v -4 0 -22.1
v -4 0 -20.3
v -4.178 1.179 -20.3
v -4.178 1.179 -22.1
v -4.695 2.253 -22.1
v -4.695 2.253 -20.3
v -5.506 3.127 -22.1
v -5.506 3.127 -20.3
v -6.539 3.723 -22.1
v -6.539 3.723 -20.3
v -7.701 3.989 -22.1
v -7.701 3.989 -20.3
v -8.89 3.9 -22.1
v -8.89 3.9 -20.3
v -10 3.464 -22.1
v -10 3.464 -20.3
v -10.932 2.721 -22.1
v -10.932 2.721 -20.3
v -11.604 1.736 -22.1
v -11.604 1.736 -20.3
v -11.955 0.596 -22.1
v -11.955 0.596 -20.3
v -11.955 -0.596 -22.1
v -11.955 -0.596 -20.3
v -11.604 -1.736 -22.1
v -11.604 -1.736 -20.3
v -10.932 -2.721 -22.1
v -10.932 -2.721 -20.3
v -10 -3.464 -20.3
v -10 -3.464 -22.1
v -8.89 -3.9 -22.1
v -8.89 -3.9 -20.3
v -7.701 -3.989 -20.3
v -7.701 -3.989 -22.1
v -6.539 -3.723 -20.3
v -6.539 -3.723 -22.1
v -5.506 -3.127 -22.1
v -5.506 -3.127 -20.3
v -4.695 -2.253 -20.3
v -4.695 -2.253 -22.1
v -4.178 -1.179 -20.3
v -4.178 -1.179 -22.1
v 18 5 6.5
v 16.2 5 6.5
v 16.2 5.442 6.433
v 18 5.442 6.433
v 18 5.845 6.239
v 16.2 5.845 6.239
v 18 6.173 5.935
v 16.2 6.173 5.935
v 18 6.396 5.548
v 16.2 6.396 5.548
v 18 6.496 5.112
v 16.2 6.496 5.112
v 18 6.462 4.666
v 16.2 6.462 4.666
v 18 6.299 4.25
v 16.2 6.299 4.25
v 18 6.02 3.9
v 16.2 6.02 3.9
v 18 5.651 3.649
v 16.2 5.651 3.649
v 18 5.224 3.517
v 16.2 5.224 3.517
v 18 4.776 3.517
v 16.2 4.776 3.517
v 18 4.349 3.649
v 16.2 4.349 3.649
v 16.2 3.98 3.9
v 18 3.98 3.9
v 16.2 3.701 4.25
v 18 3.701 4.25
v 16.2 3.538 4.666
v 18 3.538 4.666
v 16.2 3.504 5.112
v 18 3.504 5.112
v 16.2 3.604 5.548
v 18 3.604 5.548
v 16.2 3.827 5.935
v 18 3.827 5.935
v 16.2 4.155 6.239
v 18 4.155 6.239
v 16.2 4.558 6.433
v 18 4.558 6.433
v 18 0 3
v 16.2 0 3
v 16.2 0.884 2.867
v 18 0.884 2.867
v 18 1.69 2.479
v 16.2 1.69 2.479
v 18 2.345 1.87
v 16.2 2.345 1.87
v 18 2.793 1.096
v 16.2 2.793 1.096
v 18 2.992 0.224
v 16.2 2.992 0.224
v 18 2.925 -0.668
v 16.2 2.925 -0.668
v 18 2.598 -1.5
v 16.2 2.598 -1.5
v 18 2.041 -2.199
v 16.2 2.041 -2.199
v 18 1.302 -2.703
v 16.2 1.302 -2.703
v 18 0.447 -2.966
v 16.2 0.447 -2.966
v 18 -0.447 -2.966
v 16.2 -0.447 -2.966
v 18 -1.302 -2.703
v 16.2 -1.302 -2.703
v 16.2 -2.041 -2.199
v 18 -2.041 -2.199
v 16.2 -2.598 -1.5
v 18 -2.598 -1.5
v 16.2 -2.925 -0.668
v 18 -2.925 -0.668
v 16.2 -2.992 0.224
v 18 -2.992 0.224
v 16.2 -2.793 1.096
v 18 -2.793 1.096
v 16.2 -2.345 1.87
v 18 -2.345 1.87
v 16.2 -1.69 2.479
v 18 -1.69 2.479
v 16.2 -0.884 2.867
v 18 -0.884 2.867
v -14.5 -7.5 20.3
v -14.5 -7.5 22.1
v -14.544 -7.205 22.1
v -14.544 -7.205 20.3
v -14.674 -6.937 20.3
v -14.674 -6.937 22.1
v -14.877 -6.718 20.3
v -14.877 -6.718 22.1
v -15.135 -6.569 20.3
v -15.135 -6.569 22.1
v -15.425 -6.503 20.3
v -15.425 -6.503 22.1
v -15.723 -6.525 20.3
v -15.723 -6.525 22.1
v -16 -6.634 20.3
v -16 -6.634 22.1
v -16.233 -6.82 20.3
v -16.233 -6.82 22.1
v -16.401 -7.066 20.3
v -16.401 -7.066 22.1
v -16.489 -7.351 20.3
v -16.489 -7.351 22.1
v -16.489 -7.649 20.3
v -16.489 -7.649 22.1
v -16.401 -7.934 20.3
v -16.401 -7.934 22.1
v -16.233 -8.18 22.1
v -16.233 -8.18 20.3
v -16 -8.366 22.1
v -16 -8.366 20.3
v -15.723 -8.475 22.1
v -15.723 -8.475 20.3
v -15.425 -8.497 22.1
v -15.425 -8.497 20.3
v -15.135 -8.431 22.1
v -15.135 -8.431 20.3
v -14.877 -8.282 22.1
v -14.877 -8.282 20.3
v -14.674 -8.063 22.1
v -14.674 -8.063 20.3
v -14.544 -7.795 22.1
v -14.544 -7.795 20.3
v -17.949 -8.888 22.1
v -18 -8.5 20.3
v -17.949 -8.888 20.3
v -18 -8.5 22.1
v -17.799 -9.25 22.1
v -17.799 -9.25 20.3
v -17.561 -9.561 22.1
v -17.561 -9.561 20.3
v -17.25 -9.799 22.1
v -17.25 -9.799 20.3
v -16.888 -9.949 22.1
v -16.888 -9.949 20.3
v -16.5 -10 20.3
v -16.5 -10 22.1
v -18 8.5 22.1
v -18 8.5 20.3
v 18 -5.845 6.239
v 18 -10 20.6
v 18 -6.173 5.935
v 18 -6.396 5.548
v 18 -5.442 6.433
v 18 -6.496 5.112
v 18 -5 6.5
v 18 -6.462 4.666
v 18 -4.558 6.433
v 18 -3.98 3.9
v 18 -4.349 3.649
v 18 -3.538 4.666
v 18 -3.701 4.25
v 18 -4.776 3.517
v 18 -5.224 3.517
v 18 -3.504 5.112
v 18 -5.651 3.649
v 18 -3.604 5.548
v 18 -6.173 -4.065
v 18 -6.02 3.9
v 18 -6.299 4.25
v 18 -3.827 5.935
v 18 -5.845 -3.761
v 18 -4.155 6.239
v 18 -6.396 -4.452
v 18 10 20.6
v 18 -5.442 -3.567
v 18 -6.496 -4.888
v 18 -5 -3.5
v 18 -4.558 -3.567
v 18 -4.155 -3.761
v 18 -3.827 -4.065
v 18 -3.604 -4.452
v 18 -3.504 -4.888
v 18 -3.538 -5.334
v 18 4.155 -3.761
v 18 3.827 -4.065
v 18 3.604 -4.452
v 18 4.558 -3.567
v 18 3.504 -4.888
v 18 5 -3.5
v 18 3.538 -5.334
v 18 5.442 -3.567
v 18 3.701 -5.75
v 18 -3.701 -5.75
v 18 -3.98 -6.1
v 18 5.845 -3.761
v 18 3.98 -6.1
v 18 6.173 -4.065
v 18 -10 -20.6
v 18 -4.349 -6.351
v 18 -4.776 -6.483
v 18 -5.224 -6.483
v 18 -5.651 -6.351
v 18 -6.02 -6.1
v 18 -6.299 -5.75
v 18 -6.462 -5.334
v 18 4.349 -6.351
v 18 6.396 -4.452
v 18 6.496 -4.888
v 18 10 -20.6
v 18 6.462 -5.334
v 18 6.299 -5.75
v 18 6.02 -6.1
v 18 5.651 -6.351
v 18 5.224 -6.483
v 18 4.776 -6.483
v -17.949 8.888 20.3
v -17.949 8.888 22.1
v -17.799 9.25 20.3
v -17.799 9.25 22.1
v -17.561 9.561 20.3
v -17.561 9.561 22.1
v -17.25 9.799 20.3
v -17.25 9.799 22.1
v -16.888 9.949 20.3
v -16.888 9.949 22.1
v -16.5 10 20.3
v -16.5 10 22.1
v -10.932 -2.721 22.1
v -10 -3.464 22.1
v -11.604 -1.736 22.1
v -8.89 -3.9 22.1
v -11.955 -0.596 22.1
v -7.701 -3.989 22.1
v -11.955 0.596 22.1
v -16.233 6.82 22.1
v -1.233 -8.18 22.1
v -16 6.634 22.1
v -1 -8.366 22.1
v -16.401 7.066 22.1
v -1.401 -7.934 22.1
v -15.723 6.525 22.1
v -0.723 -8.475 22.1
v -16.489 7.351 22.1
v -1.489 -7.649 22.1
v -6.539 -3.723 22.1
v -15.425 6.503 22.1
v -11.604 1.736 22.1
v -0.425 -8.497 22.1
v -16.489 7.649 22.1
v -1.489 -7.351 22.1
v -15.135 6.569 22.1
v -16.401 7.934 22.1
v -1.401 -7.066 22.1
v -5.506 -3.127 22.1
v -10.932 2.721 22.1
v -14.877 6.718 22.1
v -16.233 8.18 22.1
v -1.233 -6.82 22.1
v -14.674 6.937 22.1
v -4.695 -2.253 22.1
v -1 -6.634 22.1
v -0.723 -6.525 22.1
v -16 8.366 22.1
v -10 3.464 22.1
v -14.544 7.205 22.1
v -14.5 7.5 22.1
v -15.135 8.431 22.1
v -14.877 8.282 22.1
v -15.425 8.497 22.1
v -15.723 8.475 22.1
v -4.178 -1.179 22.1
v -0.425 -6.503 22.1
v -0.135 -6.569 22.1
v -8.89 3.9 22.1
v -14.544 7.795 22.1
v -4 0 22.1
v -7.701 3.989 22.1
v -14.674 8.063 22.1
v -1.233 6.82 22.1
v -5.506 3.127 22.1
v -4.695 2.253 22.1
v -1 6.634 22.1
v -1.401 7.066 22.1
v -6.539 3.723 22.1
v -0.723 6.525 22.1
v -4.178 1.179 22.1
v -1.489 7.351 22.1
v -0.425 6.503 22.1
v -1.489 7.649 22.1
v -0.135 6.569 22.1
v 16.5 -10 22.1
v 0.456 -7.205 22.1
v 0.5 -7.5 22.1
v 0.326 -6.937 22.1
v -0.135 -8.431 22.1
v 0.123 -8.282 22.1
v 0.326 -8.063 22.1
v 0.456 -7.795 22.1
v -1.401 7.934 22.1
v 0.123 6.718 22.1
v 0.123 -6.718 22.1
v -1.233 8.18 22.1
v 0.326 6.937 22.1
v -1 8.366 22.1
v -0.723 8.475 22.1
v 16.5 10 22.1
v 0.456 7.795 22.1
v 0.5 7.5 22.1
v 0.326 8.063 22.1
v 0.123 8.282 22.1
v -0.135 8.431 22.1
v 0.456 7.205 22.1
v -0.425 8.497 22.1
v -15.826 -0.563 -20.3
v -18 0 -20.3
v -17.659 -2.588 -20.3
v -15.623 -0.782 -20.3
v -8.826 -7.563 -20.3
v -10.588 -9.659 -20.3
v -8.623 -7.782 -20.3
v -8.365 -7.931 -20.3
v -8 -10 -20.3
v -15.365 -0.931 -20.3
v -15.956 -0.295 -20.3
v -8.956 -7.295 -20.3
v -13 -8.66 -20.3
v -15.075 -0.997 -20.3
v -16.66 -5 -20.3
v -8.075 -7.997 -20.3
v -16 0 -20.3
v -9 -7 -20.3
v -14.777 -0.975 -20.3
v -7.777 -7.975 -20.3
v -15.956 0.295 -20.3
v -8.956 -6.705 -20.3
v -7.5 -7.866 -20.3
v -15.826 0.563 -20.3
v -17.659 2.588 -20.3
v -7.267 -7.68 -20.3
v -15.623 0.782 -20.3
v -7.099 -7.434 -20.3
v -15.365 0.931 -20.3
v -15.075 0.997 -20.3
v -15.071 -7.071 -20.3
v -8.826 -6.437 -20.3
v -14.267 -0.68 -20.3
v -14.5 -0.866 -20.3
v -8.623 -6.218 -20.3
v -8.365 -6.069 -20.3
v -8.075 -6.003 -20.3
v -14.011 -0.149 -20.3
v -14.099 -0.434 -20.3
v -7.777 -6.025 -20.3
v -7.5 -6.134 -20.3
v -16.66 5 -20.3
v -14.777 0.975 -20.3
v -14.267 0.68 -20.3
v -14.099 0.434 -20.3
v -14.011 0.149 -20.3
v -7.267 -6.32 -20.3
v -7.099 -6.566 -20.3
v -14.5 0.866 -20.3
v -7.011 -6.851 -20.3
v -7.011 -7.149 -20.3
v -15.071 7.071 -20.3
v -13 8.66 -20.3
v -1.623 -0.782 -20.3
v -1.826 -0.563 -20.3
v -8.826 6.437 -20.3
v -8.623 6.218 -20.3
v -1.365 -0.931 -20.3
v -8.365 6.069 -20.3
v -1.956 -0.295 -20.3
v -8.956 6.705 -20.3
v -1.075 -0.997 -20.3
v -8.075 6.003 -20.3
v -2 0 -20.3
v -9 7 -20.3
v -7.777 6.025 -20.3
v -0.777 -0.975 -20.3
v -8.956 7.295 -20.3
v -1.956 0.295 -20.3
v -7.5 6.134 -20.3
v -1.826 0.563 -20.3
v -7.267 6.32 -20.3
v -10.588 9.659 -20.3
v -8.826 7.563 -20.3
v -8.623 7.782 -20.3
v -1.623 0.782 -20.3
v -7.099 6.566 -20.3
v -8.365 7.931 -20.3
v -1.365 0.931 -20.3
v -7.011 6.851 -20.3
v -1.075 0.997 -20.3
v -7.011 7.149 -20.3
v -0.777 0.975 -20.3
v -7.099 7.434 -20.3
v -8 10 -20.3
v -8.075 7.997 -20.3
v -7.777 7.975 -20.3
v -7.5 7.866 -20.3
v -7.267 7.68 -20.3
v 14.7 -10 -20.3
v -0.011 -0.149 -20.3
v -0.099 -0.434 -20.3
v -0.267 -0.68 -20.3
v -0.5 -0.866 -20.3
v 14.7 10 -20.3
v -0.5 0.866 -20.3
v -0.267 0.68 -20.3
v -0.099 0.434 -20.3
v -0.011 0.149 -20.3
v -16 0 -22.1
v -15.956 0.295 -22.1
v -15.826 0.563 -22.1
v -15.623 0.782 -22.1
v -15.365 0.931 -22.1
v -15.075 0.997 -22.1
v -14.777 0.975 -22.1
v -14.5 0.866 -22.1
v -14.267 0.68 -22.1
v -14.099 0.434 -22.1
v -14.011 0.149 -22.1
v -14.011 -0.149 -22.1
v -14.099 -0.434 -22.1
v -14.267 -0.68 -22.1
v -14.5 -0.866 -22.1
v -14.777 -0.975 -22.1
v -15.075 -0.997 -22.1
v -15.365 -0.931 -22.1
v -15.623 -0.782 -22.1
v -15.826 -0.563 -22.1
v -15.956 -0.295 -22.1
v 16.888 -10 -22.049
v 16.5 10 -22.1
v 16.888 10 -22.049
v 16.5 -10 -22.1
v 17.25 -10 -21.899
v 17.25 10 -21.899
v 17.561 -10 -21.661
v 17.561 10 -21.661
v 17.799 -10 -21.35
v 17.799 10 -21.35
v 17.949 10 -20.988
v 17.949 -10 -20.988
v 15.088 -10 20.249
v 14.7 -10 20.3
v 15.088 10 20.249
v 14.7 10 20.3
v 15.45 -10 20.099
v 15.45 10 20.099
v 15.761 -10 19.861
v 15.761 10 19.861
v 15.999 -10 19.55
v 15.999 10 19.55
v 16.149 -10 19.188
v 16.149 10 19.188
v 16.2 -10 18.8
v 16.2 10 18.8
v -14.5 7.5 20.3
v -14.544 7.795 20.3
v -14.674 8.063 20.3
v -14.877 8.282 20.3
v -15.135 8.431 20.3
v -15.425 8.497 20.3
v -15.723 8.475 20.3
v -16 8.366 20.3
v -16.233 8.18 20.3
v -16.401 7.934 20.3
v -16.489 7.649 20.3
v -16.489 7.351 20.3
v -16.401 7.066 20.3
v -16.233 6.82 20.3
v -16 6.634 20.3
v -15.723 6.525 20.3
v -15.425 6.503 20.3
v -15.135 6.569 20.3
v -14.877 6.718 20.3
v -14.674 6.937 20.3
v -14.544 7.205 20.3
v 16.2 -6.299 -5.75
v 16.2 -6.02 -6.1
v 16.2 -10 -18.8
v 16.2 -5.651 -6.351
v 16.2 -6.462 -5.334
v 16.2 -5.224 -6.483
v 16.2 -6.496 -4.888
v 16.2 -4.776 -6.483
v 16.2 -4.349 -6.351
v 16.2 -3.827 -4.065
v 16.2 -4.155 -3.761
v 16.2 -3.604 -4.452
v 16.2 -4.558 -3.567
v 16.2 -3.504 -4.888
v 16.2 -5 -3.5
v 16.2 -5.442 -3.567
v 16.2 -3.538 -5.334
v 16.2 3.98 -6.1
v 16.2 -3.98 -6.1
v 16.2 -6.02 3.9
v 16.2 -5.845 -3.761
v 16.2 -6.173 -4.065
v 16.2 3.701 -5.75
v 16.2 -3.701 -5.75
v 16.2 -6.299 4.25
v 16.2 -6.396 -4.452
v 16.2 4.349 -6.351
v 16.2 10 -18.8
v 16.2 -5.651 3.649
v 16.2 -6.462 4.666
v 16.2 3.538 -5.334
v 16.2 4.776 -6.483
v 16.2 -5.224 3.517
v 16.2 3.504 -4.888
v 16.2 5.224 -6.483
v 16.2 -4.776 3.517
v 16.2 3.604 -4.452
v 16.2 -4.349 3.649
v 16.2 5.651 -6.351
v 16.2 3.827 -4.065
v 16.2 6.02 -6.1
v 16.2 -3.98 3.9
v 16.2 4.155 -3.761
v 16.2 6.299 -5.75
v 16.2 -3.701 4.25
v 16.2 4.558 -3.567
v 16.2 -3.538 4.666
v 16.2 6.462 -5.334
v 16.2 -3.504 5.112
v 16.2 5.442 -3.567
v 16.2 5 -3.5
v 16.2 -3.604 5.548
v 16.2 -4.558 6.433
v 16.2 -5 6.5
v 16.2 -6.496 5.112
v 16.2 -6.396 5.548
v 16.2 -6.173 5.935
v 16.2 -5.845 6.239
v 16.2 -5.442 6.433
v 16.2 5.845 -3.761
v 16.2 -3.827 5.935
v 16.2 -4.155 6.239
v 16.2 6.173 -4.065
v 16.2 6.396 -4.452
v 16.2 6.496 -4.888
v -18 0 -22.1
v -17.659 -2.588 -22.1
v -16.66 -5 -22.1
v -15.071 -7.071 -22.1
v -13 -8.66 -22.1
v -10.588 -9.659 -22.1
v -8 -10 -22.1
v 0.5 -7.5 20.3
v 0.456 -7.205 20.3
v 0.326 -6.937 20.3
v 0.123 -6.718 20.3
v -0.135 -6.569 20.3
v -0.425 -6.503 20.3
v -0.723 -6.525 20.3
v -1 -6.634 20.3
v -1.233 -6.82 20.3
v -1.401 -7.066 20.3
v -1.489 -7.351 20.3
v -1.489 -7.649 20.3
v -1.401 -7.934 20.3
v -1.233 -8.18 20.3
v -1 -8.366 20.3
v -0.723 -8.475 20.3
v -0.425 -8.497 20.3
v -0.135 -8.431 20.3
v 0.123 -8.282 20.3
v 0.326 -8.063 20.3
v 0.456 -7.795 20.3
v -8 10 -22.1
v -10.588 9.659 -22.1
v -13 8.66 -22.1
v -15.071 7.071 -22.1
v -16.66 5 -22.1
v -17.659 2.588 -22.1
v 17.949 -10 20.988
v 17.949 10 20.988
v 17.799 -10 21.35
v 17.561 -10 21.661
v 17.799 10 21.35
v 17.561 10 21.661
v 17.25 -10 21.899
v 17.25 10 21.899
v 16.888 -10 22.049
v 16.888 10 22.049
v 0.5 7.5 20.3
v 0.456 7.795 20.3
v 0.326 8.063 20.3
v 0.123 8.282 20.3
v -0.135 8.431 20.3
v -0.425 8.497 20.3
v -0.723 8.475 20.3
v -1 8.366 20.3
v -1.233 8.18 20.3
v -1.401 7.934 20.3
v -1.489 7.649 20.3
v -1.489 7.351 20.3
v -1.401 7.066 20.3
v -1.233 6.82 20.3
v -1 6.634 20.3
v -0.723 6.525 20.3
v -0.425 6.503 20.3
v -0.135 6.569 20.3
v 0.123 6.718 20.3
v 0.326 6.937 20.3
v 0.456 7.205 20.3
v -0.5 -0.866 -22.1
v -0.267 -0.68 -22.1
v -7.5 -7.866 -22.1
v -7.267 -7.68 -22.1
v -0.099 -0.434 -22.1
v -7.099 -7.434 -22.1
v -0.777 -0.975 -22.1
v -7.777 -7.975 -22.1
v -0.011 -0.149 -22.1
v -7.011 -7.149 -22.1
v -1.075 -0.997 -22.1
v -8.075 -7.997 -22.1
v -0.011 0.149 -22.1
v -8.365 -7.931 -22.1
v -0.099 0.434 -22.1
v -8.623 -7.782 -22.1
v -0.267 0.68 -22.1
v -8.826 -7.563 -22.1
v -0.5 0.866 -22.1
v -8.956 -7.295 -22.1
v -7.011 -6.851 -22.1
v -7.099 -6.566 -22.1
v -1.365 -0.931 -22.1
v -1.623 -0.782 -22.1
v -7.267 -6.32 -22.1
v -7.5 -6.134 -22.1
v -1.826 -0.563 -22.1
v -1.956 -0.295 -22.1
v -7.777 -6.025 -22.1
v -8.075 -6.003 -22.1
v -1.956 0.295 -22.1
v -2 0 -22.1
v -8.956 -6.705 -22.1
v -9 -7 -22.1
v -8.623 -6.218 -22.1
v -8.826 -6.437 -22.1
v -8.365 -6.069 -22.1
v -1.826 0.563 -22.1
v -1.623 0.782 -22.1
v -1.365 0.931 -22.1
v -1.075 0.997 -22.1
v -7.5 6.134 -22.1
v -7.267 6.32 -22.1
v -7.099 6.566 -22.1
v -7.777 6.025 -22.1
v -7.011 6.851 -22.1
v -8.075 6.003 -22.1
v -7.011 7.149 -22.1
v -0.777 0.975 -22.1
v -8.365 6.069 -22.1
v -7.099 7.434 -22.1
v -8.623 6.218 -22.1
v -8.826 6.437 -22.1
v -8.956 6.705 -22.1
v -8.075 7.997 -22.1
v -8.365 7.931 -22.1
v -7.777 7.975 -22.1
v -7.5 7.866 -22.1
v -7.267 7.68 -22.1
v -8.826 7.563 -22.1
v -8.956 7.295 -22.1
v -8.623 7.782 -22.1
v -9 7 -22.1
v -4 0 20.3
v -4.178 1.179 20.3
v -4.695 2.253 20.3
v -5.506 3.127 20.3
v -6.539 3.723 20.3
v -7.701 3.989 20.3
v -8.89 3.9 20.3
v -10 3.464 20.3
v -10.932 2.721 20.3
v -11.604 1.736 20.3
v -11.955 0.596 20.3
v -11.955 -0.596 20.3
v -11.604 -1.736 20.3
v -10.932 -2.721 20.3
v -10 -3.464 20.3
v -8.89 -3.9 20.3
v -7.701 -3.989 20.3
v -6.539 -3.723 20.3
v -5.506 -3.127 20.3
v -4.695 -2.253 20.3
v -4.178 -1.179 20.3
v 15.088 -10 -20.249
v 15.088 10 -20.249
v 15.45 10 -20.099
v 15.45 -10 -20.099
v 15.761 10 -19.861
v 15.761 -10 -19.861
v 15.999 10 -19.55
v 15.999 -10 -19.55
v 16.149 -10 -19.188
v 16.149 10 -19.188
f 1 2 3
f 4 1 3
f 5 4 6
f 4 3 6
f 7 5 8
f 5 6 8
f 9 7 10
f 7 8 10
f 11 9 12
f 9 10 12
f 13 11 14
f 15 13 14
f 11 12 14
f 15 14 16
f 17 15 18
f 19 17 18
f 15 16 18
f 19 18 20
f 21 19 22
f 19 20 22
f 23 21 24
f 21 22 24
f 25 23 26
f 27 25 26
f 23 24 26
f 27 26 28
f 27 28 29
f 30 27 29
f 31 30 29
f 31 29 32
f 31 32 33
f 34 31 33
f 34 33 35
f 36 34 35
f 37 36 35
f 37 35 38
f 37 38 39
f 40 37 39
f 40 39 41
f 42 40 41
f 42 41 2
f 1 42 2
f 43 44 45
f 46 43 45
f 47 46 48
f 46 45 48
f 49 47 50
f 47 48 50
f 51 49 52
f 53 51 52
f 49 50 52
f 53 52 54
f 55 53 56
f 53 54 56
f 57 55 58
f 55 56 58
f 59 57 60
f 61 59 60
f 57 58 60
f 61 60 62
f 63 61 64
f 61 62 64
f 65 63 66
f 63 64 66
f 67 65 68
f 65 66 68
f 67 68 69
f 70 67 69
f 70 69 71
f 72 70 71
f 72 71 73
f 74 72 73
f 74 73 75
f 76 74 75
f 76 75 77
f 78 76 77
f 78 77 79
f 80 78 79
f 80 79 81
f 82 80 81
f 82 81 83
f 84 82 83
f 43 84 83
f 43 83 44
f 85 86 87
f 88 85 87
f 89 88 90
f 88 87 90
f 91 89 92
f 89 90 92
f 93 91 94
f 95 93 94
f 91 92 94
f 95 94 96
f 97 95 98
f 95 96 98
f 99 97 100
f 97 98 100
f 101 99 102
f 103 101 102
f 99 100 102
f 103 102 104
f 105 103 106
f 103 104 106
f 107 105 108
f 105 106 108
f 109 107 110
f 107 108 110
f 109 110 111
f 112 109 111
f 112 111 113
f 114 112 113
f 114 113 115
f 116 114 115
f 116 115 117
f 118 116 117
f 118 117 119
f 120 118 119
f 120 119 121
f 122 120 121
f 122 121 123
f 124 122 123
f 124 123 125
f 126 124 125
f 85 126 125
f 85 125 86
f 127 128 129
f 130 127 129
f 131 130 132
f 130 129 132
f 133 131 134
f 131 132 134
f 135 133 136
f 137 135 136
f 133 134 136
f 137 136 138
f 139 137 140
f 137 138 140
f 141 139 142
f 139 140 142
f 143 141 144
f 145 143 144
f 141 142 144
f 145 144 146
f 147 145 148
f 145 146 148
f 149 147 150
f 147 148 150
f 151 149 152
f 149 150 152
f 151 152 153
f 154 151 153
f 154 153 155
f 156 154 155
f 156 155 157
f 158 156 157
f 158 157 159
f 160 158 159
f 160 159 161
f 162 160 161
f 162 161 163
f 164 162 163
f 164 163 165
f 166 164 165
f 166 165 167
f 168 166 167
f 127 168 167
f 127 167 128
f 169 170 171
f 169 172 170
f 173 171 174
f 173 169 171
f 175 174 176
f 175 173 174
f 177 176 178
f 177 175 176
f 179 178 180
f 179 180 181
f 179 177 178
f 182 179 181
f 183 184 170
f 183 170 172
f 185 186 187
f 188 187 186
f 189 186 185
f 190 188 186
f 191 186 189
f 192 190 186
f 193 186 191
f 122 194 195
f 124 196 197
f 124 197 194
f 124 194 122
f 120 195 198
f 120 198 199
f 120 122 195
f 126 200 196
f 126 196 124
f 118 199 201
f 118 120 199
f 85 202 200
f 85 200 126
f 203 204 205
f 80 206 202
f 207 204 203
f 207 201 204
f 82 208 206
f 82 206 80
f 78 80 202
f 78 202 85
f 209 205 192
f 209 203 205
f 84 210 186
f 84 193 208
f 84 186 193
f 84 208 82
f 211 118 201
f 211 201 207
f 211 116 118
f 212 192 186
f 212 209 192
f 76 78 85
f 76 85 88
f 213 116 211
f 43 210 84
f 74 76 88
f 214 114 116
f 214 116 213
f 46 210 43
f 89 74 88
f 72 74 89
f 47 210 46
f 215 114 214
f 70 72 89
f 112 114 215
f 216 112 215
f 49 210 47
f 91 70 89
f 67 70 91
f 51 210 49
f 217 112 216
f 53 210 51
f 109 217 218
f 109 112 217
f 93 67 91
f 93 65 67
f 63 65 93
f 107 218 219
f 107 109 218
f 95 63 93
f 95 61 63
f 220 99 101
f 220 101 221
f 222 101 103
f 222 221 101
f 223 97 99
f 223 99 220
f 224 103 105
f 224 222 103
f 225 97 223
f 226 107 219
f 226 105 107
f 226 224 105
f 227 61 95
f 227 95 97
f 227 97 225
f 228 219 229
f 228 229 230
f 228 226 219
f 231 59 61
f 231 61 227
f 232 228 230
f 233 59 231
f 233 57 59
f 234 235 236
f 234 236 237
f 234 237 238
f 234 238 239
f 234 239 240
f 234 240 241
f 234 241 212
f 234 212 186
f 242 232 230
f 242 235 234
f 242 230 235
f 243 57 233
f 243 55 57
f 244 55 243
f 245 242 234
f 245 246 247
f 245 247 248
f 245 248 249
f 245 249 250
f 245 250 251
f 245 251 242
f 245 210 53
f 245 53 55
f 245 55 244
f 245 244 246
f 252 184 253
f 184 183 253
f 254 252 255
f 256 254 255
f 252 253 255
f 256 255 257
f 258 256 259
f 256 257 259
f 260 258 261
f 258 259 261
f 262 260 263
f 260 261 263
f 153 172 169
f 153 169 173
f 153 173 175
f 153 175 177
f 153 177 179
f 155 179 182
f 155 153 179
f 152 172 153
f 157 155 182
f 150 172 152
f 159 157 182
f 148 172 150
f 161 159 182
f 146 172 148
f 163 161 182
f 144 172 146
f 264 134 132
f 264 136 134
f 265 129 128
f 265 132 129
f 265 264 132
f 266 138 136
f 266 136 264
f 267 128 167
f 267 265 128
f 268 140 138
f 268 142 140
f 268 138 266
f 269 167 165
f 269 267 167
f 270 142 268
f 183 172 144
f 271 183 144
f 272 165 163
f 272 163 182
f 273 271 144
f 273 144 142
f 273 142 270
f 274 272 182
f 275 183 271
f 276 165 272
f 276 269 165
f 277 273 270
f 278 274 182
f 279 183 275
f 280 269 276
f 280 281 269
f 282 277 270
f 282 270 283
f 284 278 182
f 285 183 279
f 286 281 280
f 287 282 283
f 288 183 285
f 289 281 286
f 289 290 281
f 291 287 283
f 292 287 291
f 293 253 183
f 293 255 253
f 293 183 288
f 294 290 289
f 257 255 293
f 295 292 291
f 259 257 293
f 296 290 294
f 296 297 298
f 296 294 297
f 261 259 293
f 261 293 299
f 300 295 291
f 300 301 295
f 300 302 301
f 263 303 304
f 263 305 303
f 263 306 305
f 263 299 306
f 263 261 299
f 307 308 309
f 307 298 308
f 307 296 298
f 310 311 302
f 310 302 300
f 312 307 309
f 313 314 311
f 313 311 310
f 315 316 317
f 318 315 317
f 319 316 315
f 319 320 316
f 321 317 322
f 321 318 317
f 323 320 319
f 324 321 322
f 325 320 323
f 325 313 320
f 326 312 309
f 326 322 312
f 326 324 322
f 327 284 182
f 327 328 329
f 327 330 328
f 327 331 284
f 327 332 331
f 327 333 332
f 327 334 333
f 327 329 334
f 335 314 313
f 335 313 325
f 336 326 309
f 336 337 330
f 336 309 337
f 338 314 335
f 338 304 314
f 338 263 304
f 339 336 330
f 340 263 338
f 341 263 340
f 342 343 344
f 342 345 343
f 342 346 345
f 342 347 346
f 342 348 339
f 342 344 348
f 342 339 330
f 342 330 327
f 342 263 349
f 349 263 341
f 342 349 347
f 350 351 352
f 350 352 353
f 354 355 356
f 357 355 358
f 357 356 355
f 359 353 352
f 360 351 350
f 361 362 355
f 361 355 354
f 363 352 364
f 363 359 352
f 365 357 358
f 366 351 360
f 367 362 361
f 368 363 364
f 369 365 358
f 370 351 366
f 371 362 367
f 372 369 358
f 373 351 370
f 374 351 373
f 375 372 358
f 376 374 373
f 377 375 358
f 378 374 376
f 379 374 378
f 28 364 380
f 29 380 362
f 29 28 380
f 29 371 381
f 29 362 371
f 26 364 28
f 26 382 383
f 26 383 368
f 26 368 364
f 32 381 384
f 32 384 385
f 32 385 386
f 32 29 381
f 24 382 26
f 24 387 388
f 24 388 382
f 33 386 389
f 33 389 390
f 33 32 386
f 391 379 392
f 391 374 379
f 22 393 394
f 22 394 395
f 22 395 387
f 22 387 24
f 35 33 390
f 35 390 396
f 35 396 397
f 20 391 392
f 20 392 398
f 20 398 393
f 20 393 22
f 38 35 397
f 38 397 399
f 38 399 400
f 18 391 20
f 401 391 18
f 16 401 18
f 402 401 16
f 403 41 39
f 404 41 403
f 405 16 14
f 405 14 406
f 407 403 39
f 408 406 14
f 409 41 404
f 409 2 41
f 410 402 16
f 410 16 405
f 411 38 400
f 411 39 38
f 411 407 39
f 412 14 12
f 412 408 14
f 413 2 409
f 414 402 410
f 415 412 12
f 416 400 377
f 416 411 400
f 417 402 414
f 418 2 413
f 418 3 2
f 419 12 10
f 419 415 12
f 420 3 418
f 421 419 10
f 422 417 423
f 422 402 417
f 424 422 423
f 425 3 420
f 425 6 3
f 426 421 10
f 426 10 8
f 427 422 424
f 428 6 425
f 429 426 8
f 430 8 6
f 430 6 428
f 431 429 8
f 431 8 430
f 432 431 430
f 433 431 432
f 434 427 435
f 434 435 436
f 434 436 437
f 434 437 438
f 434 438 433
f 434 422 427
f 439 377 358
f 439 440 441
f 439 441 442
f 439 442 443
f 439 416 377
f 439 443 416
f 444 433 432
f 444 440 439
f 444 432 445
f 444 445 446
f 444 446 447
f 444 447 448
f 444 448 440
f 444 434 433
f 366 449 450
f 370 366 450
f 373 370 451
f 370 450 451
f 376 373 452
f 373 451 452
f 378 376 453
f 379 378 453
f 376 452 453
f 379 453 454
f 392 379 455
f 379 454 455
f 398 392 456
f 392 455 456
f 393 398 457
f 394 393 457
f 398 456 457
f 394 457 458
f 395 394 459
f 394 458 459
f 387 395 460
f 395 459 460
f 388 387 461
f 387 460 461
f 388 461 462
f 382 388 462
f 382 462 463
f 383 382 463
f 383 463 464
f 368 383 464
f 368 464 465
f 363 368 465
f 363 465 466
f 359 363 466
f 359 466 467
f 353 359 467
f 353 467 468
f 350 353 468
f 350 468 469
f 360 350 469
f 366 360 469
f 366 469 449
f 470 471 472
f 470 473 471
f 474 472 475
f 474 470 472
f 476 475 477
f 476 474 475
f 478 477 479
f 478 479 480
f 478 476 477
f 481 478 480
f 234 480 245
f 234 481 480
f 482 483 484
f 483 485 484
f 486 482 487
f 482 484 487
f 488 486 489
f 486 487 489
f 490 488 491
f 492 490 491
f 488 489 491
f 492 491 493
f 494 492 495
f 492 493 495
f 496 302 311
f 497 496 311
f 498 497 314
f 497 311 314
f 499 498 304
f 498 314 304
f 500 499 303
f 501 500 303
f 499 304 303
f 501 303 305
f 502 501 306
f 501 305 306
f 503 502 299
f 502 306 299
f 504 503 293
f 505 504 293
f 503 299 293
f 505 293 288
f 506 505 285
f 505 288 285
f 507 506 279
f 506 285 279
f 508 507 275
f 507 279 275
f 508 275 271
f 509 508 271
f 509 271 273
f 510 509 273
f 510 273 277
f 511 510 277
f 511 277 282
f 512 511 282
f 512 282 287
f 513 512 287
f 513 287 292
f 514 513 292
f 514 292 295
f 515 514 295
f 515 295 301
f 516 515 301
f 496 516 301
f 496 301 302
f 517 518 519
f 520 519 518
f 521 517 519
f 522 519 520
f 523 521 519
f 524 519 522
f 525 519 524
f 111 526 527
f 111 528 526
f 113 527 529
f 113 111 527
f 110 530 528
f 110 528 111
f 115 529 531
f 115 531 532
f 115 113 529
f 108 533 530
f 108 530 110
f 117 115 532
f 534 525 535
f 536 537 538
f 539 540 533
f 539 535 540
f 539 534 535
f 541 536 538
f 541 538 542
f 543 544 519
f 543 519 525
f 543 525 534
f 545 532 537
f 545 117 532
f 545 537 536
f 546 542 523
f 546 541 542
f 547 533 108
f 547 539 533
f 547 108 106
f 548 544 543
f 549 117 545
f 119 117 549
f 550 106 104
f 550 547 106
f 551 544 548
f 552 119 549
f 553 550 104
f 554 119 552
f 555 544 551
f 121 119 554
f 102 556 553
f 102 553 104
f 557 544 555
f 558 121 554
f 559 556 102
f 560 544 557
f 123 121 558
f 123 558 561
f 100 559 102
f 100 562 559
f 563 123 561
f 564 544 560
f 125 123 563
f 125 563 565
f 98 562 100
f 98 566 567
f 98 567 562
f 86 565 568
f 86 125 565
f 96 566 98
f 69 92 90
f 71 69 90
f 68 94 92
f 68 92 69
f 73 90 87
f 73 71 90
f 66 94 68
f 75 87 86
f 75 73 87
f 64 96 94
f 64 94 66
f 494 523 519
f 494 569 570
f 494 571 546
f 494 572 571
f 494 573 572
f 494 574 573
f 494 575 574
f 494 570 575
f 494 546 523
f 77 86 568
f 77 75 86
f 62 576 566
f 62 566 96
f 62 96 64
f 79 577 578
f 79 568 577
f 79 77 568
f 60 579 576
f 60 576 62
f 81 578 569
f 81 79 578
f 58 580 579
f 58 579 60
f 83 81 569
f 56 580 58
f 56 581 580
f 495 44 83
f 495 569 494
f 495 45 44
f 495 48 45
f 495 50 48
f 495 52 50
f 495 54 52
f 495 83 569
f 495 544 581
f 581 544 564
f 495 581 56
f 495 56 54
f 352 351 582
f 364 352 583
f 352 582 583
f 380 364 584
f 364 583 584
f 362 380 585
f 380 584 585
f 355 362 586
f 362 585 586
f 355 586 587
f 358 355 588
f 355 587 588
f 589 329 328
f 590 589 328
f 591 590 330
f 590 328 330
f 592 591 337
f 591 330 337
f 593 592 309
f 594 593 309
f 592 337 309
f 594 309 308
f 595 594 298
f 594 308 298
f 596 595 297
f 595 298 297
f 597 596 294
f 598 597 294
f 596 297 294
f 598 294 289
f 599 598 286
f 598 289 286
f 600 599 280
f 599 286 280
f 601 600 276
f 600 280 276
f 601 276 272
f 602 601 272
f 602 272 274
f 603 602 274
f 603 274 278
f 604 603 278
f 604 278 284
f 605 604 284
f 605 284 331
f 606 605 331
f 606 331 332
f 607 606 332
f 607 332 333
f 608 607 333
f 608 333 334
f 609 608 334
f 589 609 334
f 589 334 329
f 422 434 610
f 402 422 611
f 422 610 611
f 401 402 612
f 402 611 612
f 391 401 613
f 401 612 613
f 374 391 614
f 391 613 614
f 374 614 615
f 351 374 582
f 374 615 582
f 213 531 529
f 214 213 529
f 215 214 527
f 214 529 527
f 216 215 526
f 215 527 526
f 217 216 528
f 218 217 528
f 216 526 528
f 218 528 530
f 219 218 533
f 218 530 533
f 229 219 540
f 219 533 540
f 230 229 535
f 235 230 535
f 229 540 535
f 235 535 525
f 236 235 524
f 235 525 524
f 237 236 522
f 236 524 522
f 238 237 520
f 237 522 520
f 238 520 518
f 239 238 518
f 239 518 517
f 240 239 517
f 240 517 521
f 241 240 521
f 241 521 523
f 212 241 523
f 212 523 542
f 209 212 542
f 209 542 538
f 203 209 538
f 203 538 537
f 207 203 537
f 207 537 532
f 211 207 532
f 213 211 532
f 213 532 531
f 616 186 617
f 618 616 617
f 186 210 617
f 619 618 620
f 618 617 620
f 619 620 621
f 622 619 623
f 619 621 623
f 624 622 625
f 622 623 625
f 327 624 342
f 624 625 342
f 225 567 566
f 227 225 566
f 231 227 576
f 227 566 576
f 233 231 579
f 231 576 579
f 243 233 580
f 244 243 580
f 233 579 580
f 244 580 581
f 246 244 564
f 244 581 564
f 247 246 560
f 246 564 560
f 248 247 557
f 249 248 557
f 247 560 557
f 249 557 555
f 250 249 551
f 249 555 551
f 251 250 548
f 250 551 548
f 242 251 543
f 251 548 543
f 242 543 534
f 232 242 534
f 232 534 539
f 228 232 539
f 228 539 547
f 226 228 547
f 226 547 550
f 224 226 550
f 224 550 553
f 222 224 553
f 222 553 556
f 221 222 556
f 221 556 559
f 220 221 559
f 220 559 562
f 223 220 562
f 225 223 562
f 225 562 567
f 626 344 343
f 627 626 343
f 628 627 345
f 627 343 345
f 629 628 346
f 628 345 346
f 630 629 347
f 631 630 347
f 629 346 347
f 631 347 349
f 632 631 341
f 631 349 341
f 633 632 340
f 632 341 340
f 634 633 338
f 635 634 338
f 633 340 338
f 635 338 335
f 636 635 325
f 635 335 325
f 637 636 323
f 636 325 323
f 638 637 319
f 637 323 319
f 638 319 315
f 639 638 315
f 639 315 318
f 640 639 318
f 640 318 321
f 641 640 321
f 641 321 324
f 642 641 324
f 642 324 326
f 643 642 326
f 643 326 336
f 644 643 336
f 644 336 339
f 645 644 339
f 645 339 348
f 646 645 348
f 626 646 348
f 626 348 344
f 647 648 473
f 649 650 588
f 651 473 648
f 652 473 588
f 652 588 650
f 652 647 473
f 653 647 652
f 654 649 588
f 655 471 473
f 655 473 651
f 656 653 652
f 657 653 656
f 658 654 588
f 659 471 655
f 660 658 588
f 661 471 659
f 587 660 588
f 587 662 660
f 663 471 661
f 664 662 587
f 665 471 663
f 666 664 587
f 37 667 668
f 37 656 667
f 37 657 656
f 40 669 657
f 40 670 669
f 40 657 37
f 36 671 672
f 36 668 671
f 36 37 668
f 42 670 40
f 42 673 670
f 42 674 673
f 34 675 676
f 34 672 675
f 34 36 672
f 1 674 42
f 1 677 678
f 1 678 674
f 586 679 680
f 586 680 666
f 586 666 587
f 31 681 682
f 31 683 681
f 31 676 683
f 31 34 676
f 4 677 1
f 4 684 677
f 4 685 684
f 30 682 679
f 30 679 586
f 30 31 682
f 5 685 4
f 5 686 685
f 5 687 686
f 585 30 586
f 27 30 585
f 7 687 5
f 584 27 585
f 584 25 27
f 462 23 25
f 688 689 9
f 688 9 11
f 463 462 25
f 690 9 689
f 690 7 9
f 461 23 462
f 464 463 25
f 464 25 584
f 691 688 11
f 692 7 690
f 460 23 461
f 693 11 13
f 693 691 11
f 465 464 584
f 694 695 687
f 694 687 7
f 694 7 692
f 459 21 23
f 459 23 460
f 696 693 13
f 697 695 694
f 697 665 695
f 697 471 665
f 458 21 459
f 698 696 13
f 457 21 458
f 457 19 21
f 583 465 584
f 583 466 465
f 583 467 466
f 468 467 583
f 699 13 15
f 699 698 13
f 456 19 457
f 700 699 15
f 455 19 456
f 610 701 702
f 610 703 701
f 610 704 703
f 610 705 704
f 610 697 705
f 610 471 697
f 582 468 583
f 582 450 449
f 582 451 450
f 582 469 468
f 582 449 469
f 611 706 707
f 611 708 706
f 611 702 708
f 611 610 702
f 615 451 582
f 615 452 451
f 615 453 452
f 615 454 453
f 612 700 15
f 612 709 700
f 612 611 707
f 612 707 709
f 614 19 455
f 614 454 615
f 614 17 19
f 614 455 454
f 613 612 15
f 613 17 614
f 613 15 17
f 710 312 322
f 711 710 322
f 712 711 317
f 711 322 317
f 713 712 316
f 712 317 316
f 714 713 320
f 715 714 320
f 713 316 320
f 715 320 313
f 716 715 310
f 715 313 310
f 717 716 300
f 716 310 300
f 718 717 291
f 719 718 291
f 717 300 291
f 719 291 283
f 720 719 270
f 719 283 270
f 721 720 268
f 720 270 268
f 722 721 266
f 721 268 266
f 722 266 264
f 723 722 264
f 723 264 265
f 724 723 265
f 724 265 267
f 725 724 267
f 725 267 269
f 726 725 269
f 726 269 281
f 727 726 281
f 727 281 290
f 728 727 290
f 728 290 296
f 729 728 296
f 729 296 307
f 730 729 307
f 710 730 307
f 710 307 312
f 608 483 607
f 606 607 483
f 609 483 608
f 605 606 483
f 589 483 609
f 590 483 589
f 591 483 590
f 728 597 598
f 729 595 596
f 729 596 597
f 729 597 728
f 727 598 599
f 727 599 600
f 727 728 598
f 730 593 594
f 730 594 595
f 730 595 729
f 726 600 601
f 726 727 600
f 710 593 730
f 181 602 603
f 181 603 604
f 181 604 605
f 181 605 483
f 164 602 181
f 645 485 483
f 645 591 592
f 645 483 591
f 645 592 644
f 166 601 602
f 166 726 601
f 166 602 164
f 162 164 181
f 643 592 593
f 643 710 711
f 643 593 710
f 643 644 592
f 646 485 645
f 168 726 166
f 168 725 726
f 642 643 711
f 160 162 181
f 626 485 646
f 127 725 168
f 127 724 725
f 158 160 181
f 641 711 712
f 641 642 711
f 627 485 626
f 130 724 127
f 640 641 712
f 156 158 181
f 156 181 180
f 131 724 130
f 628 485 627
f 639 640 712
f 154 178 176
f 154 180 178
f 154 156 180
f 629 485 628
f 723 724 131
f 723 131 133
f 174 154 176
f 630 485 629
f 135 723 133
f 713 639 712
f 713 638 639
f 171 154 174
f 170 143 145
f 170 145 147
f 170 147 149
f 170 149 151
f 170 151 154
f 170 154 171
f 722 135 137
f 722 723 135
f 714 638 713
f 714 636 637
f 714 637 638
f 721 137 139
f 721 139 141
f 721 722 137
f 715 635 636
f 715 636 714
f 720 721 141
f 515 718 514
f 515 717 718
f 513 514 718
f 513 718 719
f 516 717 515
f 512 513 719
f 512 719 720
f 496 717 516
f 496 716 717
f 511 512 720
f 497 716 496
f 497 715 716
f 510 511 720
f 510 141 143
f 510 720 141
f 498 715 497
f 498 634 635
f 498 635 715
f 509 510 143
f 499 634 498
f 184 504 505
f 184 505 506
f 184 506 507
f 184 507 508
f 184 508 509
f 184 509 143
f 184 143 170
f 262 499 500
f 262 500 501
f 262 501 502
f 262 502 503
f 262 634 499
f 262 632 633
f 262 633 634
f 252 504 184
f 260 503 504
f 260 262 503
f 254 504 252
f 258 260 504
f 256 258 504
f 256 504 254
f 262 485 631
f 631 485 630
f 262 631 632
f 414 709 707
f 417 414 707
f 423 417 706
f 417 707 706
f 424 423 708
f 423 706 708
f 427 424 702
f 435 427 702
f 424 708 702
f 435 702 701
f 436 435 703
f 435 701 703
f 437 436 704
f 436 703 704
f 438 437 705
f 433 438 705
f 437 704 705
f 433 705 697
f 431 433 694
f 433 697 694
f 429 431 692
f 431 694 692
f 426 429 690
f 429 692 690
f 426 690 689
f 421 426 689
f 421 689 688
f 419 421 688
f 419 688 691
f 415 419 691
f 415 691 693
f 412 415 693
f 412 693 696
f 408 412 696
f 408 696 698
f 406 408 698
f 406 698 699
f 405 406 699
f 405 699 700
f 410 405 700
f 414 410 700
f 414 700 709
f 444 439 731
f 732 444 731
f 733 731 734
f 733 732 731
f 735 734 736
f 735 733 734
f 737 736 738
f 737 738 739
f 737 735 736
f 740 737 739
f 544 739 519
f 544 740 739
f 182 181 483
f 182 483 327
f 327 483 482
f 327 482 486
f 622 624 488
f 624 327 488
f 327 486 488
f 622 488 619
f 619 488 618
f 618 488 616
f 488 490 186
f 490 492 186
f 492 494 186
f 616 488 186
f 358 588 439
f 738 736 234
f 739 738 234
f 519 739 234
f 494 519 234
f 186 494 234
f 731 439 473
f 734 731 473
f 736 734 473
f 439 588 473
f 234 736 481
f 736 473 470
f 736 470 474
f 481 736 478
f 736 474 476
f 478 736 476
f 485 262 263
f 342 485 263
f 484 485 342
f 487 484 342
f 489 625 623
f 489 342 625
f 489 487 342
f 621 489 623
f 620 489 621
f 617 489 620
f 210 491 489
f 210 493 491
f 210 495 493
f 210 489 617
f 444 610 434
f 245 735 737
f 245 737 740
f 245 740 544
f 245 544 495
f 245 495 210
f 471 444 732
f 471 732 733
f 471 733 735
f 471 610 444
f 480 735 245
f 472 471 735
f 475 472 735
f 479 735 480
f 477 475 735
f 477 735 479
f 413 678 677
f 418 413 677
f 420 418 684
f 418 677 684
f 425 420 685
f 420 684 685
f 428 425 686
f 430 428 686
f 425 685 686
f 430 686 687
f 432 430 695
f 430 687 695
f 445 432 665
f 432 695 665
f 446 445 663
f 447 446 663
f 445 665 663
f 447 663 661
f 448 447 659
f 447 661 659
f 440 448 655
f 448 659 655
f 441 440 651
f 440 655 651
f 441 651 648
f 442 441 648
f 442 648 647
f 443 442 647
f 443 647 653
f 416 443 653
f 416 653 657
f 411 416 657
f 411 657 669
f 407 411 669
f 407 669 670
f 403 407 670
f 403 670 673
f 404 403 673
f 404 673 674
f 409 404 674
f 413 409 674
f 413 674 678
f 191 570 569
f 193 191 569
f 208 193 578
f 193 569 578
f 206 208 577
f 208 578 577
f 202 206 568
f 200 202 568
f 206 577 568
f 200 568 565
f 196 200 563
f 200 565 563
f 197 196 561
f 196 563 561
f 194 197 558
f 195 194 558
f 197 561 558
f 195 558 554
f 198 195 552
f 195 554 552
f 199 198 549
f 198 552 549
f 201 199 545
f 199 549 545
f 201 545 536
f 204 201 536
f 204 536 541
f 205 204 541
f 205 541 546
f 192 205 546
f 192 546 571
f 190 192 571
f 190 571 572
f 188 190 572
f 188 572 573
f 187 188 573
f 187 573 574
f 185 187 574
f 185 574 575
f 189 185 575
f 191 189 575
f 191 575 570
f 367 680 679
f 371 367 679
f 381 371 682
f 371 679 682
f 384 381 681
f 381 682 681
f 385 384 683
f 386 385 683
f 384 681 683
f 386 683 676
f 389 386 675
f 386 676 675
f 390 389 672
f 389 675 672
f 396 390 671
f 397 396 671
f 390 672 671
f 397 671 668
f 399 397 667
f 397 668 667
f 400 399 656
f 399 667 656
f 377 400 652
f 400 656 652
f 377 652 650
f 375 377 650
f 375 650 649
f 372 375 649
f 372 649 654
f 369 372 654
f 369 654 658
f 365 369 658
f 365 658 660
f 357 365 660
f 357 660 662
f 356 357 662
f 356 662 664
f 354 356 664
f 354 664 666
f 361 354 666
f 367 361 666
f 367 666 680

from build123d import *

# Parameters (mm, degrees)
BOSS_EXTRUDE1_DEPTH = 10
FILLET1_R           = 1.5
CUT_EXTRUDE1_DEPTH  = 2
SKETCH4_R           = 4
CUT_EXTRUDE3_DEPTH  = 45.2
SKETCH6_R           = 3
SKETCH6_R_2         = 1.5
CUT_EXTRUDE4_DEPTH  = 2
SKETCH7_R           = 1
CUT_EXTRUDE5_DEPTH  = 2
SKETCH8_R           = 1
CUT_EXTRUDE6_DEPTH  = 2


with BuildPart() as part:
    # Sketch1 → Boss-Extrude1 (new body, symmetric)
    with BuildSketch(Plane(origin=(0, 0, 0), x_dir=(1, 0, 0), z_dir=(0, 1, 0))):
        Polygon((-18, 20.3), (16.2, 20.3), (16.2, -20.3), (-18, -20.3), (-18, -22.1), (18, -22.1), (18, 22.1), (-18, 22.1), align=None)
    extrude(amount=BOSS_EXTRUDE1_DEPTH, both=True)

    # Fillet1
    fillet1_edges = [part.edges().sort_by_distance(p)[0] for p in [
        (18, 0, -22.1),
        (18, 0, 22.1),
        (16.2, 0, 20.3),
        (16.2, 0, -20.3),
        (-18, 10, 21.2),
        (-18, -10, 21.2),
    ]]
    fillet(fillet1_edges, radius=FILLET1_R)

    # Sketch2 → Cut-Extrude1 (cut)
    with BuildSketch(Plane(origin=(0, 0, -22.1), x_dir=(-1, 0, 0), z_dir=(0, 0, -1))):
        with BuildLine():
            Line((18, 10), (8, 10))
            ThreePointArc((8, 10), (15.071067812, 7.071067812), (18, 0))
            Line((18, 0), (18, 10))
        make_face()
        with BuildLine():
            Line((18, -10), (18, 0))
            ThreePointArc((18, 0), (15.071067812, -7.071067812), (8, -10))
            Line((8, -10), (18, -10))
        make_face()
    extrude(amount=-CUT_EXTRUDE1_DEPTH, mode=Mode.SUBTRACT)

    # Sketch4 → Cut-Extrude3 (cut, through all)
    with BuildSketch(Plane.XY.offset(22.1)):
        with Locations((-8, 0)):
            Circle(SKETCH4_R)
    extrude(amount=-CUT_EXTRUDE3_DEPTH, mode=Mode.SUBTRACT)

    # Sketch6 → Cut-Extrude4 (cut)
    with BuildSketch(Plane.ZY.offset(-16.2)):
        Circle(SKETCH6_R)
        with Locations((5, -5)):
            Circle(SKETCH6_R_2)
        with Locations((-5, -5)):
            Circle(SKETCH6_R_2)
        with Locations((-5, 5)):
            Circle(SKETCH6_R_2)
        with Locations((5, 5)):
            Circle(SKETCH6_R_2)
    extrude(amount=-CUT_EXTRUDE4_DEPTH, mode=Mode.SUBTRACT)

    # Sketch7 → Cut-Extrude5 (cut)
    with BuildSketch(Plane.XY.offset(22.1)):
        with Locations((-15.5, -7.5)):
            Circle(SKETCH7_R)
        with Locations((-15.5, 7.5)):
            Circle(SKETCH7_R)
        with Locations((-0.5, 7.5)):
            Circle(SKETCH7_R)
        with Locations((-0.5, -7.5)):
            Circle(SKETCH7_R)
    extrude(amount=-CUT_EXTRUDE5_DEPTH, mode=Mode.SUBTRACT)

    # Sketch8 → Cut-Extrude6 (cut)
    with BuildSketch(Plane(origin=(0, 0, -22.1), x_dir=(-1, 0, 0), z_dir=(0, 0, -1))):
        with Locations((8, -7)):
            Circle(SKETCH8_R)
        with Locations((15, 0)):
            Circle(SKETCH8_R)
        with Locations((8, 7)):
            Circle(SKETCH8_R)
        with Locations((1, 0)):
            Circle(SKETCH8_R)
    extrude(amount=-CUT_EXTRUDE6_DEPTH, mode=Mode.SUBTRACT)


solid = part.part
